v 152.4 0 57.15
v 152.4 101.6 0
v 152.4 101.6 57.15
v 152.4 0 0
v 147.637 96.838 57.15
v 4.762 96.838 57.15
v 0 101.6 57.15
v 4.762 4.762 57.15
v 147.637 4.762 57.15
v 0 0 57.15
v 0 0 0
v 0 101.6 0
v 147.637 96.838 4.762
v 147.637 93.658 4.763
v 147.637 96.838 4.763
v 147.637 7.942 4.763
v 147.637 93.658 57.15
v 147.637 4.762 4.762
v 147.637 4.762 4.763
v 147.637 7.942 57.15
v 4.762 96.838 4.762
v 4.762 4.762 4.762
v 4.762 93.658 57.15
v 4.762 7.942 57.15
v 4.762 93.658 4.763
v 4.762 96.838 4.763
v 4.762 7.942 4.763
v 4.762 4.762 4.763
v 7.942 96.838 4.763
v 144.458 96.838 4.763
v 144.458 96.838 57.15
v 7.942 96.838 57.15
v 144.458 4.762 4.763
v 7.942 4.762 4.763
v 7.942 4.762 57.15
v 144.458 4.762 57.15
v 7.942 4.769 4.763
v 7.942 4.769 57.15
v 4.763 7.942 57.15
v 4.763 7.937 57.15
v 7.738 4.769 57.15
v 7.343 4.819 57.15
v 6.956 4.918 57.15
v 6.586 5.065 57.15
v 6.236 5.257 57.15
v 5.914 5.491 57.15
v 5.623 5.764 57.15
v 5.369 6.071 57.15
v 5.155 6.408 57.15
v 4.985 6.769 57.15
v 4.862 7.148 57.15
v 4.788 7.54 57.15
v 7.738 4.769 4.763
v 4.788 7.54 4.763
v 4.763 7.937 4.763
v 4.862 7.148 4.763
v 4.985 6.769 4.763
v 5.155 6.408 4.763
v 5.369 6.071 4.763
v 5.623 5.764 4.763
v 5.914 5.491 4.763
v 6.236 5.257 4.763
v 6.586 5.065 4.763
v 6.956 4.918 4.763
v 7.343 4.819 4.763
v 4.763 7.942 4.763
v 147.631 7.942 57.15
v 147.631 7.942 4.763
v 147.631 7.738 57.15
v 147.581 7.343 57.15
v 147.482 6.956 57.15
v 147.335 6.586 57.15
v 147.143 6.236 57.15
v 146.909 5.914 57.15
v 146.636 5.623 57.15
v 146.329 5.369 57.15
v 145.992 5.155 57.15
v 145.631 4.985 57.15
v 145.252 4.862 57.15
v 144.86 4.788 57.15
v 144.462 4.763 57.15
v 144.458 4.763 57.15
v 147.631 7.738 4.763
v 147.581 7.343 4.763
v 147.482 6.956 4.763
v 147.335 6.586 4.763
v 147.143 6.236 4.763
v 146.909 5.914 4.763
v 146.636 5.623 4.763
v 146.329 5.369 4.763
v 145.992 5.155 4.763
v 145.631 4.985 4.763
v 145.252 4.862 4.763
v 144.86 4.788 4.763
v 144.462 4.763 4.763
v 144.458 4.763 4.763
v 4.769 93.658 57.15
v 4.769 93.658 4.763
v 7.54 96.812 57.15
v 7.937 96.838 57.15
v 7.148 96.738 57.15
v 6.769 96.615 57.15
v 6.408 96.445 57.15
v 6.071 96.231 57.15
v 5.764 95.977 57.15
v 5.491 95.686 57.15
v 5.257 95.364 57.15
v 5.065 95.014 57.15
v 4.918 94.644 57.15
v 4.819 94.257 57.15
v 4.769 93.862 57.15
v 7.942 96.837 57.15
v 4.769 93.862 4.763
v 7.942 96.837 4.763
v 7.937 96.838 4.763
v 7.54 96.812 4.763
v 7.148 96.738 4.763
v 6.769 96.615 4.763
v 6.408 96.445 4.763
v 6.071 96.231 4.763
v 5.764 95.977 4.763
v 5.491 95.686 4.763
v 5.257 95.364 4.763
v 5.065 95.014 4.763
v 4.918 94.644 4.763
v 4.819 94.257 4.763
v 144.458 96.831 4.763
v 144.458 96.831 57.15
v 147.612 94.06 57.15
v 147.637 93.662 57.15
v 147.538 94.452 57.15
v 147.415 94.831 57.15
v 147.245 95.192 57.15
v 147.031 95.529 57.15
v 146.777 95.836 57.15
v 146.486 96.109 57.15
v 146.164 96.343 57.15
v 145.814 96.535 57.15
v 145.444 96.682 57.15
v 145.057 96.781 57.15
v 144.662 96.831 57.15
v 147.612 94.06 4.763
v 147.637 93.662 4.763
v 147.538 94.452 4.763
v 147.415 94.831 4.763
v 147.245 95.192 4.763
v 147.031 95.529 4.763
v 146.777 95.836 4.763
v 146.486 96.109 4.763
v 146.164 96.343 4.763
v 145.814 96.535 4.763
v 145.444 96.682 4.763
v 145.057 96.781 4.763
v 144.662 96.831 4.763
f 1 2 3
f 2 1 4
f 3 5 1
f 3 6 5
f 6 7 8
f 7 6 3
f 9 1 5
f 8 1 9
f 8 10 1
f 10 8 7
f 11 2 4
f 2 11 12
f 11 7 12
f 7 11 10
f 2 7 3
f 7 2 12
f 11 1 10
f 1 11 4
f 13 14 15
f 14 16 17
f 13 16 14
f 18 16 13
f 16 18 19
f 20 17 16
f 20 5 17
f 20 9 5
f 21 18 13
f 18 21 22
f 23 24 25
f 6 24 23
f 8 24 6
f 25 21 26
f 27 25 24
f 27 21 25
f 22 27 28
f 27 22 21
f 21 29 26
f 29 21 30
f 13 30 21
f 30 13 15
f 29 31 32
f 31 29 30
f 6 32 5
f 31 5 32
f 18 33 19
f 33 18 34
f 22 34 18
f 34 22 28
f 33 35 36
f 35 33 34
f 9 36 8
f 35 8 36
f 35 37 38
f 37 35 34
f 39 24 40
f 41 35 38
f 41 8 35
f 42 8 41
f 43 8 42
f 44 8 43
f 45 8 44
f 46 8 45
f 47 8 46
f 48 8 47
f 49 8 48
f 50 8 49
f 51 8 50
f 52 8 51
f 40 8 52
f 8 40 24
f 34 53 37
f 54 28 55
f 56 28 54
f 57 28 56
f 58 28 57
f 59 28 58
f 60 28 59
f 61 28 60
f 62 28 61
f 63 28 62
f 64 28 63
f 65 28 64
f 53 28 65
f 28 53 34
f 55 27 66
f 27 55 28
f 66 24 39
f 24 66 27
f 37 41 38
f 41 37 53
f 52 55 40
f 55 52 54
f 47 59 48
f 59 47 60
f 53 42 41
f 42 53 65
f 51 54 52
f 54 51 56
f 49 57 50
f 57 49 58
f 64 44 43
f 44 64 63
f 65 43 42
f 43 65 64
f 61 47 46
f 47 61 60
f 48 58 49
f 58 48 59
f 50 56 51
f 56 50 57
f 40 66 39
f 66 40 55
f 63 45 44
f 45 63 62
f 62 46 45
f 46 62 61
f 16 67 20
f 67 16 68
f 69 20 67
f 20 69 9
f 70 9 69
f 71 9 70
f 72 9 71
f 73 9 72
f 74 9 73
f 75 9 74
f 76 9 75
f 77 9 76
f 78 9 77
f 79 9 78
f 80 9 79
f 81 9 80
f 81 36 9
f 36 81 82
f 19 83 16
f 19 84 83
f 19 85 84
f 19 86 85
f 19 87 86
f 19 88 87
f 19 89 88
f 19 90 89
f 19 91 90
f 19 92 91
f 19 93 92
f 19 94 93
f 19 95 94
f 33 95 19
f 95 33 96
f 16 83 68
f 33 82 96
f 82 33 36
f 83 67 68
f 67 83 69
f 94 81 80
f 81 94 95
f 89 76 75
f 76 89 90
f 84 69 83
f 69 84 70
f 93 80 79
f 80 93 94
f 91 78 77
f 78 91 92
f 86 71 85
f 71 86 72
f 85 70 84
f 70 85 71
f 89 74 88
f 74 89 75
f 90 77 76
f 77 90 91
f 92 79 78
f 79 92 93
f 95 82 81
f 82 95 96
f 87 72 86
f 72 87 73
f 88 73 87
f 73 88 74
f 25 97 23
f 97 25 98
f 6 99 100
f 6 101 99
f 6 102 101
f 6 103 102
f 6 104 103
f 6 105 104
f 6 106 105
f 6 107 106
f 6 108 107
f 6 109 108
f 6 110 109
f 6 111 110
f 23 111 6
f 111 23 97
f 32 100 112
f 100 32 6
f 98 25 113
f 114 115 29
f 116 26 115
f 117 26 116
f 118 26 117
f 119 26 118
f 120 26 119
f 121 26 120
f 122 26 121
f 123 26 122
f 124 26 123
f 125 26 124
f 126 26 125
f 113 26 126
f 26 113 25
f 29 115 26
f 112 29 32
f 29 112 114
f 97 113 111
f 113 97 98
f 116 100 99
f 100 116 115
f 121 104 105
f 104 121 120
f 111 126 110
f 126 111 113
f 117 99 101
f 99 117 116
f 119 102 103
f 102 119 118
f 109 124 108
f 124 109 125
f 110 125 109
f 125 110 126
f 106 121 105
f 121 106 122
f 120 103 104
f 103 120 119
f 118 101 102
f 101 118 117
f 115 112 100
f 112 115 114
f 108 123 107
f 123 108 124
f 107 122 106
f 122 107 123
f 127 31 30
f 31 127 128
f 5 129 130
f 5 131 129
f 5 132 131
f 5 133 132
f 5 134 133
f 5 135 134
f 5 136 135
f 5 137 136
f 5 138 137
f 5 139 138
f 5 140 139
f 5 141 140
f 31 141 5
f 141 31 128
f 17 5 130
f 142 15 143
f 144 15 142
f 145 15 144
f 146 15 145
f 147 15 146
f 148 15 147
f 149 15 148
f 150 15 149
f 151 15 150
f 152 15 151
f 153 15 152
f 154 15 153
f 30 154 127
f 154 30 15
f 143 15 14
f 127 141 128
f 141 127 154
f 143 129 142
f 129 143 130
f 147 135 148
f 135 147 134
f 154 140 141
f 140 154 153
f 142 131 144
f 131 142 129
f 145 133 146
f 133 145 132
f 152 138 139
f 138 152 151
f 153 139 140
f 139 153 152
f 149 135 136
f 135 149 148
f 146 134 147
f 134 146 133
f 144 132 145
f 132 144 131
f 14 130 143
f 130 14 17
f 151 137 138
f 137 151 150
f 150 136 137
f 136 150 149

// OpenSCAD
$fn=50;
in_to_mm = 25.4;

module fillet(r, h) {
    translate([r / 2, r / 2, 0])

        difference() {
            cube([r + 0.01, r + 0.01, h], center = true);

            translate([r/2, r/2, 0])
                cylinder(r = r, h = h + 1, center = true);

        }
}


box_x = 6 * in_to_mm;
box_y = 4 * in_to_mm; 
box_z = 2.25 * in_to_mm; 
box_thickness = (3/16) * in_to_mm;

difference()
{
        
    // Main block of material
    cube([box_x, box_y, box_z]);
        
    // Internal Cutout
    translate([box_thickness, box_thickness, box_thickness])
    cube([box_x-2*box_thickness, box_y-2*box_thickness, box_z]);
    

 
//    minkowski()
//    {
//        translate([case_x/-2, case_y/-2,0])
//        cube(size=[case_x,case_y,case_z]);
//        cylinder(r=case_radius);
//    }
}

// Add fillets
rounding_radius = (1/8) * in_to_mm;
translate([box_thickness, box_thickness, (box_z-box_thickness)/2 + box_thickness])
fillet(rounding_radius, box_z-box_thickness);


translate([box_x-box_thickness, box_thickness, (box_z-box_thickness)/2 + box_thickness])
rotate([0,0,90])
fillet(rounding_radius, box_z-box_thickness);

translate([box_thickness, box_y-box_thickness, (box_z-box_thickness)/2 + box_thickness])
rotate([0,0,-90])
fillet(rounding_radius, box_z-box_thickness);

translate([box_x-box_thickness, box_y-box_thickness, (box_z-box_thickness)/2 + box_thickness])
rotate([0,0,180])
fillet(rounding_radius, box_z-box_thickness);
